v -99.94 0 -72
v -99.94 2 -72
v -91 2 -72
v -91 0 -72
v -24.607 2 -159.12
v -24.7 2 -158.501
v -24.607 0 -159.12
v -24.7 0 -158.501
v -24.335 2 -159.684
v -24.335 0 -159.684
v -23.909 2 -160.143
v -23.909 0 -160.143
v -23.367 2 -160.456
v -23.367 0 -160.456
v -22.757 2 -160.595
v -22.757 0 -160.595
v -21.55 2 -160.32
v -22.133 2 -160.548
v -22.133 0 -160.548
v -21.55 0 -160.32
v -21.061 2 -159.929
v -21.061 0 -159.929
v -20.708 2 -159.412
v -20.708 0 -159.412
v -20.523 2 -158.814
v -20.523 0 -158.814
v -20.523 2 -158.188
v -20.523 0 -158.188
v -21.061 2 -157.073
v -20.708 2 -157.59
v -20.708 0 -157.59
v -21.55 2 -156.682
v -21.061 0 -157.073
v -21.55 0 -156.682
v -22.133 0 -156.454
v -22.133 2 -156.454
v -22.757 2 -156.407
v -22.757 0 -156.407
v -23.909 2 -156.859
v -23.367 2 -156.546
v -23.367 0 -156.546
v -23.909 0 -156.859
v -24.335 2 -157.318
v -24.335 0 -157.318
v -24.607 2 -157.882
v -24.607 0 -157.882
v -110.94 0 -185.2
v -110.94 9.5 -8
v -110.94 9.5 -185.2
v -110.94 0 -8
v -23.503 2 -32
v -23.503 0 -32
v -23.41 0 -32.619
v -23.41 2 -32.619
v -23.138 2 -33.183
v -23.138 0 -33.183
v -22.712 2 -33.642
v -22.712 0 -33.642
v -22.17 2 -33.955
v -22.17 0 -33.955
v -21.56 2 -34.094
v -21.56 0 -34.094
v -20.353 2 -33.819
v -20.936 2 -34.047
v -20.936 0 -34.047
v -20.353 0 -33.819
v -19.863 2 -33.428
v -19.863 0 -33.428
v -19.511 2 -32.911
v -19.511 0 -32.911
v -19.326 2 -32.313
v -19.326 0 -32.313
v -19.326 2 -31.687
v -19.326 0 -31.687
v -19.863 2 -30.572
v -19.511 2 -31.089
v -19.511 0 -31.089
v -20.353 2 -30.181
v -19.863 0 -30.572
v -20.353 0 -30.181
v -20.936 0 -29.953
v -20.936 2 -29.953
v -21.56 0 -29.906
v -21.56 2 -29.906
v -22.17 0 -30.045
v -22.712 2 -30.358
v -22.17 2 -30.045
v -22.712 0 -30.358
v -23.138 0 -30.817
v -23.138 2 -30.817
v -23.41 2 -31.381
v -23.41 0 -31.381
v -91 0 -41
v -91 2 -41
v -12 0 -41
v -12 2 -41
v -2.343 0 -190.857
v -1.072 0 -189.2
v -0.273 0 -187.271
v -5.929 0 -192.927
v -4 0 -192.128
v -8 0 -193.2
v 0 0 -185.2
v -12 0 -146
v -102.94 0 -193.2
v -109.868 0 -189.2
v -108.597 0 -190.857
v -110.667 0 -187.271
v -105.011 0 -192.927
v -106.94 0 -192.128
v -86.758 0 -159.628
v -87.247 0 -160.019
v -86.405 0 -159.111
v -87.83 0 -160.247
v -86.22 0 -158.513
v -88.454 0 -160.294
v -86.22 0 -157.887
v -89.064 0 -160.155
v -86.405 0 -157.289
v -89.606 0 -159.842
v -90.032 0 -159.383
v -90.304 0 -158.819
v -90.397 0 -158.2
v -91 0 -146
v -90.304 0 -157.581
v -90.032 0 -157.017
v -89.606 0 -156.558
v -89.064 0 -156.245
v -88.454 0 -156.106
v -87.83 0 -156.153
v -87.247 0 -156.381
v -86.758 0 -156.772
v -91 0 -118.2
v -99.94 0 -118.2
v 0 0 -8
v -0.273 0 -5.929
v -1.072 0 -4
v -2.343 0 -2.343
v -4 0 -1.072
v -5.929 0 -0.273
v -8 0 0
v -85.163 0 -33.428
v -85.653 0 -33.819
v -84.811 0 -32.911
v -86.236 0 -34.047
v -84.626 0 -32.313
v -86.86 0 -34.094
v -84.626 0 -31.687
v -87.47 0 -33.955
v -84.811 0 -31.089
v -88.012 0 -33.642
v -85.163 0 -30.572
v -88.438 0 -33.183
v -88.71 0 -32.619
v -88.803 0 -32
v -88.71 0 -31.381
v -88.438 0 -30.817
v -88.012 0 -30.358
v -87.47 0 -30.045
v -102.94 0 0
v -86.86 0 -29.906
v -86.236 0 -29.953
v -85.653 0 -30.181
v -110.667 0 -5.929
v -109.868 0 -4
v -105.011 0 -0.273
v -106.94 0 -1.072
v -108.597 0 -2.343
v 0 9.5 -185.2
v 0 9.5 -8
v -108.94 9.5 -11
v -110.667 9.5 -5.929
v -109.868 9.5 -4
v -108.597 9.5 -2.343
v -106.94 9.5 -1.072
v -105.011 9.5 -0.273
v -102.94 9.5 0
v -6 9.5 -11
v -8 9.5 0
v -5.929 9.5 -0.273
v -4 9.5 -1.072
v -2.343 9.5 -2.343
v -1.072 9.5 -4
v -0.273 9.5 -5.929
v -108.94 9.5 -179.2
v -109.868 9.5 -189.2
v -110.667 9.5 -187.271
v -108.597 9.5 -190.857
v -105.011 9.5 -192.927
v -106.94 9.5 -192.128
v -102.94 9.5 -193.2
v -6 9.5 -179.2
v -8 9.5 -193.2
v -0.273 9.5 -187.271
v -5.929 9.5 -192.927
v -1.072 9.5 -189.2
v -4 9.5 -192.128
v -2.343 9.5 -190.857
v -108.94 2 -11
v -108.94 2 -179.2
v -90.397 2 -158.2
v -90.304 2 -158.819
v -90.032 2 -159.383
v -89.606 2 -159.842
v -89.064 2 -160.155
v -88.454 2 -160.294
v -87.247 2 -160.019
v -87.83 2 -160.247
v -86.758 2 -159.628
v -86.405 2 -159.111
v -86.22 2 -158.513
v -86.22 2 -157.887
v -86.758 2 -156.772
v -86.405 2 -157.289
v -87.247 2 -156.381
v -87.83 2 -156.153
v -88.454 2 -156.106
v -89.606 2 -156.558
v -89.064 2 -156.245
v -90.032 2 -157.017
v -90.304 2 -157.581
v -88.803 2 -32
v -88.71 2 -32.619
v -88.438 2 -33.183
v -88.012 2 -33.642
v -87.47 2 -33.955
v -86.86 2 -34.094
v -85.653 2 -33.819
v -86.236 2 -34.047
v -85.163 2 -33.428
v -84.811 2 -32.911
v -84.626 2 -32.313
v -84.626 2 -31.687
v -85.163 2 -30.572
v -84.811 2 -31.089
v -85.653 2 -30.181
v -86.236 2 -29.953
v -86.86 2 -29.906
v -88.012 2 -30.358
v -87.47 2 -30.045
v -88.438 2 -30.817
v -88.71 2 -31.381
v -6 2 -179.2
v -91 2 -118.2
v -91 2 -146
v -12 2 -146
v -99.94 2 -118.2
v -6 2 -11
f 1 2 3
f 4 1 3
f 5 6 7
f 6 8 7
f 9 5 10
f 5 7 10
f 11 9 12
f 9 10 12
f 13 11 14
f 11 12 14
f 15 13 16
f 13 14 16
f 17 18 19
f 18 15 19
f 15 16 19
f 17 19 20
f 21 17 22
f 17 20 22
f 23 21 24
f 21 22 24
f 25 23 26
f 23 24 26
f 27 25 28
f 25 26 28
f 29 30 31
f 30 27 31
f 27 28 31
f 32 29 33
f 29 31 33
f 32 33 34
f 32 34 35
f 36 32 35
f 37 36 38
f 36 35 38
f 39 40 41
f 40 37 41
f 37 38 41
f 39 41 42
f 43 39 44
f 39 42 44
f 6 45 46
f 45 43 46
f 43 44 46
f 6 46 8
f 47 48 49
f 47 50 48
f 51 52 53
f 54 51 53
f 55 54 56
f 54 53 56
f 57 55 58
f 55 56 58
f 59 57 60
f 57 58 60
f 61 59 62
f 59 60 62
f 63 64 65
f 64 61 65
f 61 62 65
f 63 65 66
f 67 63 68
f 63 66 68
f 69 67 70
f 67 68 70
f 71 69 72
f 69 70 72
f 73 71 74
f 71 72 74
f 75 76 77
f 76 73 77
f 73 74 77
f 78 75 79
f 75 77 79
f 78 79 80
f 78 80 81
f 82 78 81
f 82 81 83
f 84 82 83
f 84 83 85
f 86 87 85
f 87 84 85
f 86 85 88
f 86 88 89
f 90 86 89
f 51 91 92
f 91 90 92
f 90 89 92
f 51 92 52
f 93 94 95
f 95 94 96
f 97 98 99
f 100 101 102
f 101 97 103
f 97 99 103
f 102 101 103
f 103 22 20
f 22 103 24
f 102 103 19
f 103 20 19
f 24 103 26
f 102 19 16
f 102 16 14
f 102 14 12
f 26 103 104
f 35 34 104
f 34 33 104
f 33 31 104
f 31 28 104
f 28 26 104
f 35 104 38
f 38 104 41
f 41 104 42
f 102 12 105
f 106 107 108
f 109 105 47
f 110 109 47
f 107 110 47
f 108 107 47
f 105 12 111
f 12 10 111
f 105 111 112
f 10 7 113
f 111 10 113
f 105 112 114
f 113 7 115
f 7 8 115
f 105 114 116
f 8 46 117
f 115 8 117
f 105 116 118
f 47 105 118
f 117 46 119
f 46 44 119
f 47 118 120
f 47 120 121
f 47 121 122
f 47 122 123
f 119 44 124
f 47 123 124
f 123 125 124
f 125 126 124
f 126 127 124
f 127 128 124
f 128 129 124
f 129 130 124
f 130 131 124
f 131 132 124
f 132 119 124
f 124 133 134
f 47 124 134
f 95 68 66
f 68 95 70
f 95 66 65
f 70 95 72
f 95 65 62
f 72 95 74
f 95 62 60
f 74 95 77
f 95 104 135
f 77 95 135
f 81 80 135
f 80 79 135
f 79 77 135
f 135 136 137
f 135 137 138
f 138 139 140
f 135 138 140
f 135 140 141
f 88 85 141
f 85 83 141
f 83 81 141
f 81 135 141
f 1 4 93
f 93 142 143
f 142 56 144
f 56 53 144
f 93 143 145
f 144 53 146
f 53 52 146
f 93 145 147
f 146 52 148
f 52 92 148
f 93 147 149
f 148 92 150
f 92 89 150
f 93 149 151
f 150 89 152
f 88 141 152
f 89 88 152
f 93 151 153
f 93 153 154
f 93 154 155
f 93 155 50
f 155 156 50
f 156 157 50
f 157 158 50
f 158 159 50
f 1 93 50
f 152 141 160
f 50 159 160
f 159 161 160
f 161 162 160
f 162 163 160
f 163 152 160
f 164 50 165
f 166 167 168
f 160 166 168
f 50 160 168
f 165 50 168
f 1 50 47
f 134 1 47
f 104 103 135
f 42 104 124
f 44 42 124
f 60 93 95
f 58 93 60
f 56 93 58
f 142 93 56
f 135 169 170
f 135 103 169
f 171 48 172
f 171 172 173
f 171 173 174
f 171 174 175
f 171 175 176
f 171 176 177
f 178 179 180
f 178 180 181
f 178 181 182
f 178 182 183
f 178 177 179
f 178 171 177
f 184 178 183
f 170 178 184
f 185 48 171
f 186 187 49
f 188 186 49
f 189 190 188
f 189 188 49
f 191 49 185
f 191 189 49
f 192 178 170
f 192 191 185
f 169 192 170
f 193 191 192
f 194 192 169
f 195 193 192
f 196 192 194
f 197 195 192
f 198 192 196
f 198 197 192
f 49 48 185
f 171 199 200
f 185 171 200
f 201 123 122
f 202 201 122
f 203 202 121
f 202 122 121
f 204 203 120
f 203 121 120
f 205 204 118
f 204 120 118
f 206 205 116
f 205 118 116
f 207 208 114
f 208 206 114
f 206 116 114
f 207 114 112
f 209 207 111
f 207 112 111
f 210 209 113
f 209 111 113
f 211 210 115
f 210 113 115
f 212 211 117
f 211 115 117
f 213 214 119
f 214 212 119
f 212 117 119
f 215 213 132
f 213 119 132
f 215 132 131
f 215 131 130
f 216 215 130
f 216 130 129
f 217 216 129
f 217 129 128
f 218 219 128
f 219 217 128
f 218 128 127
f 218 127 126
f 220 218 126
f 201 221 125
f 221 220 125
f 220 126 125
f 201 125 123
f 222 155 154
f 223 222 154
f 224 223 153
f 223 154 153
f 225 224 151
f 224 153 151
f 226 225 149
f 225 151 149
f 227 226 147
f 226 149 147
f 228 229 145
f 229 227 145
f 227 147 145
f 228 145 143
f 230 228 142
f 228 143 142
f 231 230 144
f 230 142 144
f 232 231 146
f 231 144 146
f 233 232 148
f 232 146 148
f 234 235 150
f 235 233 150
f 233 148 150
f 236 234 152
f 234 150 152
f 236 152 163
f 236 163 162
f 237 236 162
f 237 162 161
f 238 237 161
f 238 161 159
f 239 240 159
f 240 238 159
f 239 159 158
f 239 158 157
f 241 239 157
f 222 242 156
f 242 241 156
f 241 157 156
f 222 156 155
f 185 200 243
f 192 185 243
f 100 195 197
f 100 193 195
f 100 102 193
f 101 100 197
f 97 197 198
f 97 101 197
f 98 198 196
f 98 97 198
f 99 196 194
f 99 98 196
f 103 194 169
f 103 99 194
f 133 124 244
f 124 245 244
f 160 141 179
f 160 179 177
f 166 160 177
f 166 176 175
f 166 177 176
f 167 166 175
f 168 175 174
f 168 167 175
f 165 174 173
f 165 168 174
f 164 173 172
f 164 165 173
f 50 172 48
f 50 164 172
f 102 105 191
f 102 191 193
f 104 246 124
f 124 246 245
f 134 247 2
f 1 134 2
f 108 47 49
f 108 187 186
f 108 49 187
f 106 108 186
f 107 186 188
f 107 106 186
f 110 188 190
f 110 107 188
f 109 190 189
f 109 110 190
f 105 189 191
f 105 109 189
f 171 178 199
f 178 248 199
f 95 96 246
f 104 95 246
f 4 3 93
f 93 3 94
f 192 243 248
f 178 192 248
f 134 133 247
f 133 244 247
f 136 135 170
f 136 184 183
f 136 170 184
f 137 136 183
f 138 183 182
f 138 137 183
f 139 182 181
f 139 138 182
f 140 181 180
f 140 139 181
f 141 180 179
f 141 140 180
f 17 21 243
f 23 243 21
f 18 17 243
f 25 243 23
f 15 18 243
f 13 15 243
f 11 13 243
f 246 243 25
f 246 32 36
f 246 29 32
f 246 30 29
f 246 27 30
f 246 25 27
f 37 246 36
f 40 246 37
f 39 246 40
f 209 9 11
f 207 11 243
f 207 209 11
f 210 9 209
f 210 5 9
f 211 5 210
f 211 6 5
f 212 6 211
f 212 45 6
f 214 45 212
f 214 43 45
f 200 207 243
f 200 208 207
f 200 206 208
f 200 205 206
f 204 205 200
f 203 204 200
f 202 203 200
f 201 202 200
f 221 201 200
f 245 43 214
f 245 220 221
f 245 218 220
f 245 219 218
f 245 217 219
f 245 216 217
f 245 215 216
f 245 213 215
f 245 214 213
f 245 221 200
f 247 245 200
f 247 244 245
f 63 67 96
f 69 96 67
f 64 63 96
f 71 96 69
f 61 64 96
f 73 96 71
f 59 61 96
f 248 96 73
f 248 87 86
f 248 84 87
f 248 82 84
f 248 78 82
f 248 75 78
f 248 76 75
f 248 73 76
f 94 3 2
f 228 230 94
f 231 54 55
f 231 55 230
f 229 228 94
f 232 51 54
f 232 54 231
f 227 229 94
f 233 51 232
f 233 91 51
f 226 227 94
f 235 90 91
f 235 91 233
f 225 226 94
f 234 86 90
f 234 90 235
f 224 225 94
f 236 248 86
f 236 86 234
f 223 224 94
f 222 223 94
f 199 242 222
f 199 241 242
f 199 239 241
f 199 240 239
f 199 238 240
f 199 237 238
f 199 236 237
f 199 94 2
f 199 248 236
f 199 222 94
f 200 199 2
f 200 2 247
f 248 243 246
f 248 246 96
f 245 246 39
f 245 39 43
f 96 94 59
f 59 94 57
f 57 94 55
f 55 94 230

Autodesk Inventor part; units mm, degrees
ref_plane "YZ Plane" through (0, 0, 0) normal (1, 0, 0) x (0, 1, 0)
ref_plane "XZ Plane" through (0, 0, 0) normal (0, 1, 0) x (-1, 0, 0)
ref_plane "XY Plane" through (0, 0, 0) normal (0, 0, 1) x (1, 0, 0)
sketch "Sketch1" plane through (0, 0, 0) normal (0, 1, 0) x (-1, 0, 0)
  line L0 (8, 0) -> (102.94, 0)
  line L1 (110.94, -8) -> (110.94, -185.2)
  line L2 (102.94, -193.2) -> (8, -193.2)
  line L3 (0, -185.2) -> (0, -8)
  circle A0 centre (86.7029, -32) radius 2.1
  circle A1 centre (88.297, -158.2) radius 2.1
  circle A2 centre (22.6, -158.501) radius 2.1
  circle A3 centre (21.4029, -32) radius 2.1
  arc A4 (110.94, -8) -> (102.94, 0) centre (102.94, -8) ccw
  arc A5 (8, 0) -> (0, -8) centre (8, -8) ccw
  arc A6 (0, -185.2) -> (8, -193.2) centre (8, -185.2) ccw
  arc A7 (102.94, -193.2) -> (110.94, -185.2) centre (102.94, -185.2) ccw
  point P0 (0, 0)
  dimension "d0" = 110.94
  dimension "d1" = 193.2
  dimension "d2" = 4.2
  dimension "d3" = 4.2
  dimension "d4" = 65.3
  dimension "d5" = 65.697
  dimension "d6" = 4.2
  dimension "d7" = 4.2
  dimension "d8" = 126.2
  dimension "d9" = 126.501
  dimension "d10" = 0
  dimension "d11" = 22.6
  dimension "d12" = 35
  dimension "d13" = 8
extrude "Extrusion1" add sketch "Sketch1" along normal blind 2
sketch "Sketch2" plane through (0, 2, 0) normal (0, 1, 0) x (1, 0, 0)
  line L0 (-8, 193.2) -> (-102.94, 193.2) projected
  arc A0 (-102.94, 193.2) -> (-110.94, 185.2) centre (-102.94, 185.2) ccw projected
  line L1 (-110.94, 185.2) -> (-110.94, 8) projected
  arc A1 (-110.94, 8) -> (-102.94, 0) centre (-102.94, 8) ccw projected
  line L2 (-102.94, 0) -> (-8, 0) projected
  arc A2 (-8, 0) -> (0, 8) centre (-8, 8) ccw projected
  line L3 (0, 8) -> (0, 185.2) projected
  arc A3 (0, 185.2) -> (-8, 193.2) centre (-8, 185.2) ccw projected
  circle A4 centre (-86.7029, 32) radius 2.1 projected
  circle A5 centre (-88.297, 158.2) radius 2.1 projected
  circle A6 centre (-22.6, 158.501) radius 2.1 projected
  circle A7 centre (-21.4029, 32) radius 2.1 projected
  line L4 (-108.94, 11) -> (-108.94, 179.2)
  line L5 (-108.94, 179.2) -> (-6, 179.2)
  line L6 (-6, 11) -> (-108.94, 11)
  line L7 (-6, 179.2) -> (-6, 11)
  point P0 (0, 0)
  dimension "d16" = 2
  dimension "d17" = 14
  dimension "d18" = 11
  dimension "d19" = 6
extrude "Extrusion2" add sketch "Sketch2" along normal blind 7.5 contours A3 L3 A2 L2 A1 L1 A0 L0
sketch "Sketch3" plane through (0, 2, 0) normal (0, 1, 0) x (1, 0, 0)
  line L0 (-91, 41) -> (-12, 41)
  line L1 (-12, 41) -> (-12, 146)
  line L2 (-12, 146) -> (-91, 146)
  line L3 (-6, 179.2) -> (-6, 11) projected
  line L4 (-6, 11) -> (-108.94, 11) projected
  line L5 (-99.94, 72) -> (-91, 72)
  line L6 (-91, 118.2) -> (-99.94, 118.2)
  line L7 (-99.94, 118.2) -> (-99.94, 72)
  circle A0 centre (-88.297, 158.2) radius 2.1 projected
  circle A1 centre (-86.7029, 32) radius 2.1 projected
  line L8 (-108.94, 11) -> (-108.94, 179.2) projected
  line L9 (-91, 146) -> (-91, 118.2)
  line L10 (-91, 72) -> (-91, 41)
  point P0 (0, 0)
  dimension "d22" = 105
  dimension "d24" = 6
  dimension "d25" = 30
  dimension "d26" = 40
  dimension "d27" = 40
  dimension "d28" = 9
extrude "Extrusion3" cut sketch "Sketch3" against normal blind 7.5 contours L10 L5 L7 L6 L9 L2 L1 L0
properties part number "Front"
